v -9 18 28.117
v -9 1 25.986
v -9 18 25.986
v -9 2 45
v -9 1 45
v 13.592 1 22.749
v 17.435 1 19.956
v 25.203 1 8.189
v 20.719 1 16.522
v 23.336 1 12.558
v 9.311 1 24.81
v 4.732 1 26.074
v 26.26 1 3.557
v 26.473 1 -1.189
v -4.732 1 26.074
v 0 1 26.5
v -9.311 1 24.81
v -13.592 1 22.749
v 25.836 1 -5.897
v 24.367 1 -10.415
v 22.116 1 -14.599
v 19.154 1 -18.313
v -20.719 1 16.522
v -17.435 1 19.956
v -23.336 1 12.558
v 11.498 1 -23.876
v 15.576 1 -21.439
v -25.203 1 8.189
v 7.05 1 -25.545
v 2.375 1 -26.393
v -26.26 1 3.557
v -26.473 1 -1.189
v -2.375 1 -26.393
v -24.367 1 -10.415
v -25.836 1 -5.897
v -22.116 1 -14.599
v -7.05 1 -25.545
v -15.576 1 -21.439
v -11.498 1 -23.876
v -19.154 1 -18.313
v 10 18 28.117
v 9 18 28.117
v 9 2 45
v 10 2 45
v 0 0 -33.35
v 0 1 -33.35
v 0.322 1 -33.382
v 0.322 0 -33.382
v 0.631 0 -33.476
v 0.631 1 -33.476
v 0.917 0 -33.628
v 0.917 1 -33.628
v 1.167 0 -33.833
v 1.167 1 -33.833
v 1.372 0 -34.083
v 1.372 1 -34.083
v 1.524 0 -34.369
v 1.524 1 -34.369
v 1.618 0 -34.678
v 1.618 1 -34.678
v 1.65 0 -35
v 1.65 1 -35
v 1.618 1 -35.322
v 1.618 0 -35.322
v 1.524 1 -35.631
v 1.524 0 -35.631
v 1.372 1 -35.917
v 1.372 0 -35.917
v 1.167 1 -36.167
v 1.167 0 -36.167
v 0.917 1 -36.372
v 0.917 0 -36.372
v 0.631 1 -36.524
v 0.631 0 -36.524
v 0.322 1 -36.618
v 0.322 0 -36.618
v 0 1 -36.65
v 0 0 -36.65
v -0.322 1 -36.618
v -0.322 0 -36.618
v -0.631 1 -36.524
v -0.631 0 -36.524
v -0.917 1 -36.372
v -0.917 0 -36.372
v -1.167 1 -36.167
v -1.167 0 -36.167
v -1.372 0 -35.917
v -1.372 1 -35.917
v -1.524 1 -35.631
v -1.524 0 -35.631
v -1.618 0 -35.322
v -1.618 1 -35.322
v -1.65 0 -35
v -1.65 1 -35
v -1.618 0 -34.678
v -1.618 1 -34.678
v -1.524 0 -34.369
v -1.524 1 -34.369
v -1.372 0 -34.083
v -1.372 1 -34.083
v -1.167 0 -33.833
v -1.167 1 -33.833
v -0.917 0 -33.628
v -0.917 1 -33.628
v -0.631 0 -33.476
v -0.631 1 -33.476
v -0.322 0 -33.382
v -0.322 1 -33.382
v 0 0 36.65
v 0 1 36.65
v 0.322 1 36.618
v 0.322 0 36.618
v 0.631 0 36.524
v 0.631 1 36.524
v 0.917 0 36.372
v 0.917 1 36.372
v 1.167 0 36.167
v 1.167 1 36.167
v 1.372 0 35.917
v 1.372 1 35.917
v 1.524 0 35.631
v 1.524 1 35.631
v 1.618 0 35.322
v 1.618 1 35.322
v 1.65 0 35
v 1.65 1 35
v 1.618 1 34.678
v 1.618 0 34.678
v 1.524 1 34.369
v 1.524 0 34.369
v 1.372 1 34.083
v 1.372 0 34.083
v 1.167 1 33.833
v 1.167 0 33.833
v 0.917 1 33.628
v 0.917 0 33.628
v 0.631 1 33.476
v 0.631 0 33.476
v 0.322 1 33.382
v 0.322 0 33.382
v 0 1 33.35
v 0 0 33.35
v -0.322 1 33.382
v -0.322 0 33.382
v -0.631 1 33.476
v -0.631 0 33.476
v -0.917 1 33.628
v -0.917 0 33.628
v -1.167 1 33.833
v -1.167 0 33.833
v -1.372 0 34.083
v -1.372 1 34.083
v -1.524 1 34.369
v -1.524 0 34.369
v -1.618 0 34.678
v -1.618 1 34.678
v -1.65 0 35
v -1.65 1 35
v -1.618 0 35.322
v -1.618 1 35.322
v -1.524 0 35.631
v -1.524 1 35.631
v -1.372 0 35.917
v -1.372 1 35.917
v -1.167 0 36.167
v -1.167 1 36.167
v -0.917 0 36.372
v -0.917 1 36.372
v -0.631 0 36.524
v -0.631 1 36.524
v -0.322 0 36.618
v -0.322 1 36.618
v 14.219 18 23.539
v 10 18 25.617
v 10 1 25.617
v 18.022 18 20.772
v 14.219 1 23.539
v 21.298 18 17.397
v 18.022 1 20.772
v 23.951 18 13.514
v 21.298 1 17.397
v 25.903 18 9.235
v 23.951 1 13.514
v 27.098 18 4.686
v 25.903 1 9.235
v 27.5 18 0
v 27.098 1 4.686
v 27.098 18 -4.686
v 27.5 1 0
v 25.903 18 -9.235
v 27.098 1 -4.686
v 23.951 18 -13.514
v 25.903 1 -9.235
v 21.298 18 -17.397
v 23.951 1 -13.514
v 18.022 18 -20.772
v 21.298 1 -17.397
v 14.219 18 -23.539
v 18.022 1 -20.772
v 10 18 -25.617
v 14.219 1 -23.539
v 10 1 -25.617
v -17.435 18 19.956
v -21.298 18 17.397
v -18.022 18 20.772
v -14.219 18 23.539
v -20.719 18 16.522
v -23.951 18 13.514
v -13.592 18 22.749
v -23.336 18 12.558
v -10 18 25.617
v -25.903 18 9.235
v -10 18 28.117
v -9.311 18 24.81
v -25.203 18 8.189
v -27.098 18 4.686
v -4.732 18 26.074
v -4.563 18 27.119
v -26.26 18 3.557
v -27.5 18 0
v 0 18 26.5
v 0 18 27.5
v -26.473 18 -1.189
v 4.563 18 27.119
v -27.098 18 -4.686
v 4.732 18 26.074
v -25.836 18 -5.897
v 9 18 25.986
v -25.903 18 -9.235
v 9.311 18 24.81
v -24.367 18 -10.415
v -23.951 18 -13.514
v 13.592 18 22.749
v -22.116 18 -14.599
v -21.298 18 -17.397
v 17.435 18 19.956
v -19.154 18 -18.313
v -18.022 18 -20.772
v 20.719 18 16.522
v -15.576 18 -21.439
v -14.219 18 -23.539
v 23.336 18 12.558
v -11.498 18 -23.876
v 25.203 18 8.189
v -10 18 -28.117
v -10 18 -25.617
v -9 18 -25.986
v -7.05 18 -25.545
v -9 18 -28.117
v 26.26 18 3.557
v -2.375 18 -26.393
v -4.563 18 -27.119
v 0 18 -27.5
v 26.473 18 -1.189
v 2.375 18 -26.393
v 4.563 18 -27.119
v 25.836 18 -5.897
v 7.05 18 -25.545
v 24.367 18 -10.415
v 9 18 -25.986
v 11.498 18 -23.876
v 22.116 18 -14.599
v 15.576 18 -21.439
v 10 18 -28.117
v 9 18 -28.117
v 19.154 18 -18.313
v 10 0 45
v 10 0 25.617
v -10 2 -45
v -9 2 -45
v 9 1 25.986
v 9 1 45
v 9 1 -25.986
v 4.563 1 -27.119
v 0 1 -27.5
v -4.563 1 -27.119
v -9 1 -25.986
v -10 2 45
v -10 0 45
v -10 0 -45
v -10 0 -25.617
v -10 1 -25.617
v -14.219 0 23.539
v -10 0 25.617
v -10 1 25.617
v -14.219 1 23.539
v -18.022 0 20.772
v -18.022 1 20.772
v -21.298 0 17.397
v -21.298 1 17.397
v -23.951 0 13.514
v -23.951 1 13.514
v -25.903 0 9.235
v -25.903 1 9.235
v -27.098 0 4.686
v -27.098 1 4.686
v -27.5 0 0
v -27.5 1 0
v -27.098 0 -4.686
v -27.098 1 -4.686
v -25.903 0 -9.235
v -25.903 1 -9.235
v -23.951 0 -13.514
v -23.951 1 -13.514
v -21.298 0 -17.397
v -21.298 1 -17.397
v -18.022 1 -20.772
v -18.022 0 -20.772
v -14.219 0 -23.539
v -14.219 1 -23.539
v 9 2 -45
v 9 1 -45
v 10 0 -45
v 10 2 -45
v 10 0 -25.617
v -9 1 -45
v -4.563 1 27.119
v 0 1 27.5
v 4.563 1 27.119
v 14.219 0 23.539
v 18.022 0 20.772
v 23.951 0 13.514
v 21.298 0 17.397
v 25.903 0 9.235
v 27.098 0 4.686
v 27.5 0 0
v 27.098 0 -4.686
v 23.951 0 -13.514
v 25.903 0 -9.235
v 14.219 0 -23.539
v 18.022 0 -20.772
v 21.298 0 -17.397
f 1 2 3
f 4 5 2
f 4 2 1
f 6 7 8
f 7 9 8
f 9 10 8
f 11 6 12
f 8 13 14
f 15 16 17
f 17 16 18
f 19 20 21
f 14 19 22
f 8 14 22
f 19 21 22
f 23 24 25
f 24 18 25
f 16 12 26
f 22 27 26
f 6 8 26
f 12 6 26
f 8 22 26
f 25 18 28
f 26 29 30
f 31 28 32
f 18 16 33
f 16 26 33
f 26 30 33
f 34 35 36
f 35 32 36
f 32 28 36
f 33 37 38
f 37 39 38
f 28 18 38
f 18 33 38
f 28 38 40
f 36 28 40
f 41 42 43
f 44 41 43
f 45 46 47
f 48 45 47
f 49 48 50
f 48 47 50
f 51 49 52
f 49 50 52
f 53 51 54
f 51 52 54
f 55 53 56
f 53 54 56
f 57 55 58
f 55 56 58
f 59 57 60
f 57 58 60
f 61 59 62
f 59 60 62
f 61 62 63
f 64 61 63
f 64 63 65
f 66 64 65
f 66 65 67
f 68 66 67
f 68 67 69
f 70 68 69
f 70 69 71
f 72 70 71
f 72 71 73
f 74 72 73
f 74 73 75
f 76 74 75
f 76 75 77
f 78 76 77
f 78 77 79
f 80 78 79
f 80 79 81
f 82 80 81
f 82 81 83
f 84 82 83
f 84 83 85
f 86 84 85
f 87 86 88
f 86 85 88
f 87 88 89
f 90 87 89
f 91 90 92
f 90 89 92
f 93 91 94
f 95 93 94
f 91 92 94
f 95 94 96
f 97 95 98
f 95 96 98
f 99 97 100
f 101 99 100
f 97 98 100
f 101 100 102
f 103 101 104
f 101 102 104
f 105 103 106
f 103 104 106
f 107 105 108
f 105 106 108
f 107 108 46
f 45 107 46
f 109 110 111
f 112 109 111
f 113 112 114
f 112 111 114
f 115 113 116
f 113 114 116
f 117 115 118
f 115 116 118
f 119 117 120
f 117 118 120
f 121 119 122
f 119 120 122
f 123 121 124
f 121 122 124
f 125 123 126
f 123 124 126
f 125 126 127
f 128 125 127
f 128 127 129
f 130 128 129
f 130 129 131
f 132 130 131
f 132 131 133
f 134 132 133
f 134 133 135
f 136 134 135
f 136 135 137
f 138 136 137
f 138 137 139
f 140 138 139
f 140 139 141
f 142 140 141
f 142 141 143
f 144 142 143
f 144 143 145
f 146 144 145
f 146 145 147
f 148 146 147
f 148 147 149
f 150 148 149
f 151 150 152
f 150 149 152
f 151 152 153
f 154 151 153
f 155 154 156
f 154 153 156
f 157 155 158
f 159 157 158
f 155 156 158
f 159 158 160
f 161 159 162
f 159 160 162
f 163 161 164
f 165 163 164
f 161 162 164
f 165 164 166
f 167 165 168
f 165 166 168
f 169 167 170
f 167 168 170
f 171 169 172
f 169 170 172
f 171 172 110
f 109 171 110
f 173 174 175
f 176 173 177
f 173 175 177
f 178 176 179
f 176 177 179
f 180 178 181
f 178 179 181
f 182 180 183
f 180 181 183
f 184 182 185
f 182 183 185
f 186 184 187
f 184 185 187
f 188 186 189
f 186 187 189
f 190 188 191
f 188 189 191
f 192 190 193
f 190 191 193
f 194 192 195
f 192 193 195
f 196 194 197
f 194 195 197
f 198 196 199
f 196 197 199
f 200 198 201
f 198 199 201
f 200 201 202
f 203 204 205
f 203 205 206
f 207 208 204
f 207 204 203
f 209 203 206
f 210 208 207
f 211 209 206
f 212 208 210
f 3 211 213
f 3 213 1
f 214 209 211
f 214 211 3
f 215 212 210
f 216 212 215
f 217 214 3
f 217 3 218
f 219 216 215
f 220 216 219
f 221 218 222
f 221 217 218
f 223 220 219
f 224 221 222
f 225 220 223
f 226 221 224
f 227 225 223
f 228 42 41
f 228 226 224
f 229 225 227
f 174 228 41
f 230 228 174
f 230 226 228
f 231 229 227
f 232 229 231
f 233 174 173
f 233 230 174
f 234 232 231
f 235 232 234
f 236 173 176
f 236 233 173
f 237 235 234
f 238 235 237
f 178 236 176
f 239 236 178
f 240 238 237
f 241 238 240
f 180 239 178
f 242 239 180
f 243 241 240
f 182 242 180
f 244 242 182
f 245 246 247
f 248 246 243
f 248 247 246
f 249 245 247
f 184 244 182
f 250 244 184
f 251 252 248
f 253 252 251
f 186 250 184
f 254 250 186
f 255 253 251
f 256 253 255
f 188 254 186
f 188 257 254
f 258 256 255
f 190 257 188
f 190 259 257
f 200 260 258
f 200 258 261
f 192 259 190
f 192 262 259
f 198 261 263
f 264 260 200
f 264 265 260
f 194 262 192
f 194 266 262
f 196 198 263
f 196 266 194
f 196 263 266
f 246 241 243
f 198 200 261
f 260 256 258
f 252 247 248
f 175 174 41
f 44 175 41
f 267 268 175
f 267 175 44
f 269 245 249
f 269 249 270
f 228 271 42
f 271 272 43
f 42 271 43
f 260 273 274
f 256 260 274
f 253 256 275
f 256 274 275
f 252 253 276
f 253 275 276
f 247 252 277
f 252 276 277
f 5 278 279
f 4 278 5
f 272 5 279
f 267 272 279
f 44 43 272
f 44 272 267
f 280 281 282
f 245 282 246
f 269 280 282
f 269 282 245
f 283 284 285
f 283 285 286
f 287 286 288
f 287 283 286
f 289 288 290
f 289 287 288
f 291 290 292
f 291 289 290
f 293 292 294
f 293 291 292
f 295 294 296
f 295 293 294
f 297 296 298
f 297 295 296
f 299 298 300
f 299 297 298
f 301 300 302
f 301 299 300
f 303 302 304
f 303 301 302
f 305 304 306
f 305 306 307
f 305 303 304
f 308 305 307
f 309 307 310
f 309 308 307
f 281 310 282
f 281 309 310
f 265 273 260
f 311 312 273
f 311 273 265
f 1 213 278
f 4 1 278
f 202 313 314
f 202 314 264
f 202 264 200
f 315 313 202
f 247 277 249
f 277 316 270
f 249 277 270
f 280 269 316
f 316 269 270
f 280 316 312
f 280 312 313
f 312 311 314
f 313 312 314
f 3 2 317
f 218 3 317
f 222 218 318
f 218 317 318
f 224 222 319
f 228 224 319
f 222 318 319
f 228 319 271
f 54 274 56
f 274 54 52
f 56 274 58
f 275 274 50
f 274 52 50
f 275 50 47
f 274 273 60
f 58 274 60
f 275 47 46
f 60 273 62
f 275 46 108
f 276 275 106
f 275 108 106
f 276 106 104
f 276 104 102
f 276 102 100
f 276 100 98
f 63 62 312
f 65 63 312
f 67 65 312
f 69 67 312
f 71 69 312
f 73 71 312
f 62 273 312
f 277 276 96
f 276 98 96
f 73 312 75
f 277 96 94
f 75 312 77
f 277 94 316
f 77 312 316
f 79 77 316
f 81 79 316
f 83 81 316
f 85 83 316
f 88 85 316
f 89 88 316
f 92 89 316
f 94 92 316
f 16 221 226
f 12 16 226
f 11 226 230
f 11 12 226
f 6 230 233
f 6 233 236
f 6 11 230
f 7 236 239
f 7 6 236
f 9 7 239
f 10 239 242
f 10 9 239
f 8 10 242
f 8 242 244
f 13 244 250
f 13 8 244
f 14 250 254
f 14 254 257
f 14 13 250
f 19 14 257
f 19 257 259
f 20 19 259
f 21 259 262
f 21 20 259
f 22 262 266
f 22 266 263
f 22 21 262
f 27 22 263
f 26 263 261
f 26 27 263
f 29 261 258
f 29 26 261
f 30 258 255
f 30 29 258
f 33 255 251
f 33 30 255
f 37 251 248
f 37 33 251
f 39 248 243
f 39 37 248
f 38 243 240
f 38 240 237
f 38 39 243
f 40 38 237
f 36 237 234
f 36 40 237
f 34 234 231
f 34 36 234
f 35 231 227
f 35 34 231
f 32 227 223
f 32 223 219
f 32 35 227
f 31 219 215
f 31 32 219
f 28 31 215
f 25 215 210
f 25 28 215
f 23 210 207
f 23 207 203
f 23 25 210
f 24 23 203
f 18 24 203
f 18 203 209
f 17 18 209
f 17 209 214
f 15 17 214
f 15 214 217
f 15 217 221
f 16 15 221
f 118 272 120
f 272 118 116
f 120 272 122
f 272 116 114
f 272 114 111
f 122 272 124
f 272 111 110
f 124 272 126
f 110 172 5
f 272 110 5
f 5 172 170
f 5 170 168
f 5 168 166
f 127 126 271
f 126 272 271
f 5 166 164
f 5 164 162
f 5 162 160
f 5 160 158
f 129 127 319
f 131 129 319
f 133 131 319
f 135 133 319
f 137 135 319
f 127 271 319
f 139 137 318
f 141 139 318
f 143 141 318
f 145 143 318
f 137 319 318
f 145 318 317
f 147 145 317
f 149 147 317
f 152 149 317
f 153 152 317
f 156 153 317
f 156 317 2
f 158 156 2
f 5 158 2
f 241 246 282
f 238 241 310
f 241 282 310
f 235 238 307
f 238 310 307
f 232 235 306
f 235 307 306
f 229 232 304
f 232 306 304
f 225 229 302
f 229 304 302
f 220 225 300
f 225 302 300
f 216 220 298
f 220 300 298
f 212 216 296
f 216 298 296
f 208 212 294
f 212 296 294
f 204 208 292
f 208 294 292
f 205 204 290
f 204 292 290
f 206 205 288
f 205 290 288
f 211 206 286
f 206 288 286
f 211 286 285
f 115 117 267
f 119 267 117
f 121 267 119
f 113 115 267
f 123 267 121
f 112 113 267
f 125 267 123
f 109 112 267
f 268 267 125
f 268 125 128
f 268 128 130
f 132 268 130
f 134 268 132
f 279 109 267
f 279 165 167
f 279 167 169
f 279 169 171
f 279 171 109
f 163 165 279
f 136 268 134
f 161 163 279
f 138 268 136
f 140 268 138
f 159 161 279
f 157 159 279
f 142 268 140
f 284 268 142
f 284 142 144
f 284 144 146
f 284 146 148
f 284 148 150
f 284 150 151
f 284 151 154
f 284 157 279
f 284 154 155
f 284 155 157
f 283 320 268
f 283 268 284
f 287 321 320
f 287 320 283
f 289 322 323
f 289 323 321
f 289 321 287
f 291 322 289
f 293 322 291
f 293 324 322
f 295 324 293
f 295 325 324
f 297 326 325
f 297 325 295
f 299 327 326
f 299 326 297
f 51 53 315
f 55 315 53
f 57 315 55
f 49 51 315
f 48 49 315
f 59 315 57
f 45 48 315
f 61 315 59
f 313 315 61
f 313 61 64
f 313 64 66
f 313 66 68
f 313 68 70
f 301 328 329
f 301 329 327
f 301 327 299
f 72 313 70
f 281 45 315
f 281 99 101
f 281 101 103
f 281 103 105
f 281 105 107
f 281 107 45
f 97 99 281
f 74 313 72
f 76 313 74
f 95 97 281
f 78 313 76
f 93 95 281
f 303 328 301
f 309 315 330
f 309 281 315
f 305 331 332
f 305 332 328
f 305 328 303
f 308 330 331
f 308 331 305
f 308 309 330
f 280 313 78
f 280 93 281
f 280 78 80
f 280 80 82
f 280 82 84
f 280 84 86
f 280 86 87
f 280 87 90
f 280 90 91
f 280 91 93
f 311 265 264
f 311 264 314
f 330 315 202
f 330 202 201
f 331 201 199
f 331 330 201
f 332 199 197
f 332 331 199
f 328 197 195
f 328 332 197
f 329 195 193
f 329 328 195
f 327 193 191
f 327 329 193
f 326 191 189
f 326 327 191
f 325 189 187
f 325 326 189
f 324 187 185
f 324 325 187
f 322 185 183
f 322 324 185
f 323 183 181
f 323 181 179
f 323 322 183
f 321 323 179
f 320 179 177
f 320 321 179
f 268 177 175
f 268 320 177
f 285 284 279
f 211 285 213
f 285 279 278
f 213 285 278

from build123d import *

# Parameters (mm, degrees)
EXTRUDE_2_DEPTH      = 1
SKETCH_6_R           = 27.5
SKETCH_6_R_2         = 26.5
EXTRUDE_3_DEPTH      = 17
EXTRUDE_4_REACH      = 97.814
EXTRUDE_4_END_RADIUS = 27.5
SKETCH_8_W           = 1
SKETCH_8_H           = 17
CUT_EXTRUDE_2_DEPTH  = 20
SKETCH_11_R          = 1.65
CUT_EXTRUDE_3_DEPTH  = 20


with BuildPart() as part:
    # 草图3 → 凸台-拉伸2 (new body)
    with BuildSketch(Plane(origin=(0, 0, 0), x_dir=(1, 0, 0), z_dir=(0, 1, 0))):
        with BuildLine():
            Line((-10, 25.617376915), (-10, 45))
            Line((-10, 45), (10, 45))
            Line((10, 45), (10, 25.617376915))
            ThreePointArc((10, 25.617376915), (27.5, 0), (10, -25.617376915))
            Line((10, -25.617376915), (10, -45))
            Line((10, -45), (-10, -45))
            Line((-10, -45), (-10, -25.617376915))
            ThreePointArc((-10, -25.617376915), (-27.5, 0), (-10, 25.617376915))
        make_face()
    extrude(amount=EXTRUDE_2_DEPTH)

    # 草图6 → 凸台-拉伸3 (add)
    with BuildSketch(Plane(origin=(0, 1, 0), x_dir=(1, 0, 0), z_dir=(0, 1, 0))):
        with Locations(Location((0, 0, 0), (0, 0, 68.676313737))):
            Circle(SKETCH_6_R)
        with Locations(Location((0, 0, 0), (0, 0, 270))):
            Circle(SKETCH_6_R_2, mode=Mode.SUBTRACT)
    extrude(amount=EXTRUDE_3_DEPTH)

    # 凸台-拉伸4: up to this cylinder (the profile starts outside it)
    extrude_4_end = Plane(origin=(0, 9.5, 0), z_dir=(0, -1, 0)) * Cylinder(EXTRUDE_4_END_RADIUS, 251.628, mode=Mode.PRIVATE)
    # 草图8 → 凸台-拉伸4 (add, up to the surface)
    with BuildSketch(Plane.XY.offset(45), mode=Mode.PRIVATE) as extrude_4_sk1:
        with Locations((-9.5, 9.5)):
            Rectangle(SKETCH_8_W, SKETCH_8_H)
    extrude_4_tool1 = extrude(extrude_4_sk1.sketch, amount=-EXTRUDE_4_REACH, mode=Mode.PRIVATE) - extrude_4_end
    # 草图8 → 凸台-拉伸4 (add, up to the surface)
    with BuildSketch(Plane.XY.offset(45), mode=Mode.PRIVATE) as extrude_4_sk2:
        with Locations((9.5, 9.5)):
            Rectangle(SKETCH_8_W, SKETCH_8_H)
    extrude_4_tool2 = extrude(extrude_4_sk2.sketch, amount=-EXTRUDE_4_REACH, mode=Mode.PRIVATE) - extrude_4_end
    extrude_4 = extrude_4_tool1.solids().sort_by_distance((-9.5, 9.5, 45))[0] + extrude_4_tool2.solids().sort_by_distance((9.5, 9.5, 45))[0]
    add(extrude_4)

    # 草图9 → 切除-拉伸2 (cut)
    with BuildSketch(Plane.ZY.offset(10)):
        Polygon((28.117376915, 18), (45, 2), (45, 18), align=None)
    cut_extrude_2 = extrude(amount=-CUT_EXTRUDE_2_DEPTH, mode=Mode.SUBTRACT)

    # 镜向1: 凸台-拉伸4, 切除-拉伸2 across plane
    add(extrude_4.mirror(Plane.XY))
    add(cut_extrude_2.mirror(Plane.XY), mode=Mode.SUBTRACT)

    # 草图11 → 切除-拉伸3 (cut)
    with BuildSketch(Plane(origin=(0, 1, 0), x_dir=(1, 0, 0), z_dir=(0, 1, 0))):
        with Locations(Location((0, 35, 0), (0, 0, 270))):
            Circle(SKETCH_11_R)
        with Locations(Location((0, -35, 0), (0, 0, 270))):
            Circle(SKETCH_11_R)
    extrude(amount=-CUT_EXTRUDE_3_DEPTH, mode=Mode.SUBTRACT)


solid = part.part
